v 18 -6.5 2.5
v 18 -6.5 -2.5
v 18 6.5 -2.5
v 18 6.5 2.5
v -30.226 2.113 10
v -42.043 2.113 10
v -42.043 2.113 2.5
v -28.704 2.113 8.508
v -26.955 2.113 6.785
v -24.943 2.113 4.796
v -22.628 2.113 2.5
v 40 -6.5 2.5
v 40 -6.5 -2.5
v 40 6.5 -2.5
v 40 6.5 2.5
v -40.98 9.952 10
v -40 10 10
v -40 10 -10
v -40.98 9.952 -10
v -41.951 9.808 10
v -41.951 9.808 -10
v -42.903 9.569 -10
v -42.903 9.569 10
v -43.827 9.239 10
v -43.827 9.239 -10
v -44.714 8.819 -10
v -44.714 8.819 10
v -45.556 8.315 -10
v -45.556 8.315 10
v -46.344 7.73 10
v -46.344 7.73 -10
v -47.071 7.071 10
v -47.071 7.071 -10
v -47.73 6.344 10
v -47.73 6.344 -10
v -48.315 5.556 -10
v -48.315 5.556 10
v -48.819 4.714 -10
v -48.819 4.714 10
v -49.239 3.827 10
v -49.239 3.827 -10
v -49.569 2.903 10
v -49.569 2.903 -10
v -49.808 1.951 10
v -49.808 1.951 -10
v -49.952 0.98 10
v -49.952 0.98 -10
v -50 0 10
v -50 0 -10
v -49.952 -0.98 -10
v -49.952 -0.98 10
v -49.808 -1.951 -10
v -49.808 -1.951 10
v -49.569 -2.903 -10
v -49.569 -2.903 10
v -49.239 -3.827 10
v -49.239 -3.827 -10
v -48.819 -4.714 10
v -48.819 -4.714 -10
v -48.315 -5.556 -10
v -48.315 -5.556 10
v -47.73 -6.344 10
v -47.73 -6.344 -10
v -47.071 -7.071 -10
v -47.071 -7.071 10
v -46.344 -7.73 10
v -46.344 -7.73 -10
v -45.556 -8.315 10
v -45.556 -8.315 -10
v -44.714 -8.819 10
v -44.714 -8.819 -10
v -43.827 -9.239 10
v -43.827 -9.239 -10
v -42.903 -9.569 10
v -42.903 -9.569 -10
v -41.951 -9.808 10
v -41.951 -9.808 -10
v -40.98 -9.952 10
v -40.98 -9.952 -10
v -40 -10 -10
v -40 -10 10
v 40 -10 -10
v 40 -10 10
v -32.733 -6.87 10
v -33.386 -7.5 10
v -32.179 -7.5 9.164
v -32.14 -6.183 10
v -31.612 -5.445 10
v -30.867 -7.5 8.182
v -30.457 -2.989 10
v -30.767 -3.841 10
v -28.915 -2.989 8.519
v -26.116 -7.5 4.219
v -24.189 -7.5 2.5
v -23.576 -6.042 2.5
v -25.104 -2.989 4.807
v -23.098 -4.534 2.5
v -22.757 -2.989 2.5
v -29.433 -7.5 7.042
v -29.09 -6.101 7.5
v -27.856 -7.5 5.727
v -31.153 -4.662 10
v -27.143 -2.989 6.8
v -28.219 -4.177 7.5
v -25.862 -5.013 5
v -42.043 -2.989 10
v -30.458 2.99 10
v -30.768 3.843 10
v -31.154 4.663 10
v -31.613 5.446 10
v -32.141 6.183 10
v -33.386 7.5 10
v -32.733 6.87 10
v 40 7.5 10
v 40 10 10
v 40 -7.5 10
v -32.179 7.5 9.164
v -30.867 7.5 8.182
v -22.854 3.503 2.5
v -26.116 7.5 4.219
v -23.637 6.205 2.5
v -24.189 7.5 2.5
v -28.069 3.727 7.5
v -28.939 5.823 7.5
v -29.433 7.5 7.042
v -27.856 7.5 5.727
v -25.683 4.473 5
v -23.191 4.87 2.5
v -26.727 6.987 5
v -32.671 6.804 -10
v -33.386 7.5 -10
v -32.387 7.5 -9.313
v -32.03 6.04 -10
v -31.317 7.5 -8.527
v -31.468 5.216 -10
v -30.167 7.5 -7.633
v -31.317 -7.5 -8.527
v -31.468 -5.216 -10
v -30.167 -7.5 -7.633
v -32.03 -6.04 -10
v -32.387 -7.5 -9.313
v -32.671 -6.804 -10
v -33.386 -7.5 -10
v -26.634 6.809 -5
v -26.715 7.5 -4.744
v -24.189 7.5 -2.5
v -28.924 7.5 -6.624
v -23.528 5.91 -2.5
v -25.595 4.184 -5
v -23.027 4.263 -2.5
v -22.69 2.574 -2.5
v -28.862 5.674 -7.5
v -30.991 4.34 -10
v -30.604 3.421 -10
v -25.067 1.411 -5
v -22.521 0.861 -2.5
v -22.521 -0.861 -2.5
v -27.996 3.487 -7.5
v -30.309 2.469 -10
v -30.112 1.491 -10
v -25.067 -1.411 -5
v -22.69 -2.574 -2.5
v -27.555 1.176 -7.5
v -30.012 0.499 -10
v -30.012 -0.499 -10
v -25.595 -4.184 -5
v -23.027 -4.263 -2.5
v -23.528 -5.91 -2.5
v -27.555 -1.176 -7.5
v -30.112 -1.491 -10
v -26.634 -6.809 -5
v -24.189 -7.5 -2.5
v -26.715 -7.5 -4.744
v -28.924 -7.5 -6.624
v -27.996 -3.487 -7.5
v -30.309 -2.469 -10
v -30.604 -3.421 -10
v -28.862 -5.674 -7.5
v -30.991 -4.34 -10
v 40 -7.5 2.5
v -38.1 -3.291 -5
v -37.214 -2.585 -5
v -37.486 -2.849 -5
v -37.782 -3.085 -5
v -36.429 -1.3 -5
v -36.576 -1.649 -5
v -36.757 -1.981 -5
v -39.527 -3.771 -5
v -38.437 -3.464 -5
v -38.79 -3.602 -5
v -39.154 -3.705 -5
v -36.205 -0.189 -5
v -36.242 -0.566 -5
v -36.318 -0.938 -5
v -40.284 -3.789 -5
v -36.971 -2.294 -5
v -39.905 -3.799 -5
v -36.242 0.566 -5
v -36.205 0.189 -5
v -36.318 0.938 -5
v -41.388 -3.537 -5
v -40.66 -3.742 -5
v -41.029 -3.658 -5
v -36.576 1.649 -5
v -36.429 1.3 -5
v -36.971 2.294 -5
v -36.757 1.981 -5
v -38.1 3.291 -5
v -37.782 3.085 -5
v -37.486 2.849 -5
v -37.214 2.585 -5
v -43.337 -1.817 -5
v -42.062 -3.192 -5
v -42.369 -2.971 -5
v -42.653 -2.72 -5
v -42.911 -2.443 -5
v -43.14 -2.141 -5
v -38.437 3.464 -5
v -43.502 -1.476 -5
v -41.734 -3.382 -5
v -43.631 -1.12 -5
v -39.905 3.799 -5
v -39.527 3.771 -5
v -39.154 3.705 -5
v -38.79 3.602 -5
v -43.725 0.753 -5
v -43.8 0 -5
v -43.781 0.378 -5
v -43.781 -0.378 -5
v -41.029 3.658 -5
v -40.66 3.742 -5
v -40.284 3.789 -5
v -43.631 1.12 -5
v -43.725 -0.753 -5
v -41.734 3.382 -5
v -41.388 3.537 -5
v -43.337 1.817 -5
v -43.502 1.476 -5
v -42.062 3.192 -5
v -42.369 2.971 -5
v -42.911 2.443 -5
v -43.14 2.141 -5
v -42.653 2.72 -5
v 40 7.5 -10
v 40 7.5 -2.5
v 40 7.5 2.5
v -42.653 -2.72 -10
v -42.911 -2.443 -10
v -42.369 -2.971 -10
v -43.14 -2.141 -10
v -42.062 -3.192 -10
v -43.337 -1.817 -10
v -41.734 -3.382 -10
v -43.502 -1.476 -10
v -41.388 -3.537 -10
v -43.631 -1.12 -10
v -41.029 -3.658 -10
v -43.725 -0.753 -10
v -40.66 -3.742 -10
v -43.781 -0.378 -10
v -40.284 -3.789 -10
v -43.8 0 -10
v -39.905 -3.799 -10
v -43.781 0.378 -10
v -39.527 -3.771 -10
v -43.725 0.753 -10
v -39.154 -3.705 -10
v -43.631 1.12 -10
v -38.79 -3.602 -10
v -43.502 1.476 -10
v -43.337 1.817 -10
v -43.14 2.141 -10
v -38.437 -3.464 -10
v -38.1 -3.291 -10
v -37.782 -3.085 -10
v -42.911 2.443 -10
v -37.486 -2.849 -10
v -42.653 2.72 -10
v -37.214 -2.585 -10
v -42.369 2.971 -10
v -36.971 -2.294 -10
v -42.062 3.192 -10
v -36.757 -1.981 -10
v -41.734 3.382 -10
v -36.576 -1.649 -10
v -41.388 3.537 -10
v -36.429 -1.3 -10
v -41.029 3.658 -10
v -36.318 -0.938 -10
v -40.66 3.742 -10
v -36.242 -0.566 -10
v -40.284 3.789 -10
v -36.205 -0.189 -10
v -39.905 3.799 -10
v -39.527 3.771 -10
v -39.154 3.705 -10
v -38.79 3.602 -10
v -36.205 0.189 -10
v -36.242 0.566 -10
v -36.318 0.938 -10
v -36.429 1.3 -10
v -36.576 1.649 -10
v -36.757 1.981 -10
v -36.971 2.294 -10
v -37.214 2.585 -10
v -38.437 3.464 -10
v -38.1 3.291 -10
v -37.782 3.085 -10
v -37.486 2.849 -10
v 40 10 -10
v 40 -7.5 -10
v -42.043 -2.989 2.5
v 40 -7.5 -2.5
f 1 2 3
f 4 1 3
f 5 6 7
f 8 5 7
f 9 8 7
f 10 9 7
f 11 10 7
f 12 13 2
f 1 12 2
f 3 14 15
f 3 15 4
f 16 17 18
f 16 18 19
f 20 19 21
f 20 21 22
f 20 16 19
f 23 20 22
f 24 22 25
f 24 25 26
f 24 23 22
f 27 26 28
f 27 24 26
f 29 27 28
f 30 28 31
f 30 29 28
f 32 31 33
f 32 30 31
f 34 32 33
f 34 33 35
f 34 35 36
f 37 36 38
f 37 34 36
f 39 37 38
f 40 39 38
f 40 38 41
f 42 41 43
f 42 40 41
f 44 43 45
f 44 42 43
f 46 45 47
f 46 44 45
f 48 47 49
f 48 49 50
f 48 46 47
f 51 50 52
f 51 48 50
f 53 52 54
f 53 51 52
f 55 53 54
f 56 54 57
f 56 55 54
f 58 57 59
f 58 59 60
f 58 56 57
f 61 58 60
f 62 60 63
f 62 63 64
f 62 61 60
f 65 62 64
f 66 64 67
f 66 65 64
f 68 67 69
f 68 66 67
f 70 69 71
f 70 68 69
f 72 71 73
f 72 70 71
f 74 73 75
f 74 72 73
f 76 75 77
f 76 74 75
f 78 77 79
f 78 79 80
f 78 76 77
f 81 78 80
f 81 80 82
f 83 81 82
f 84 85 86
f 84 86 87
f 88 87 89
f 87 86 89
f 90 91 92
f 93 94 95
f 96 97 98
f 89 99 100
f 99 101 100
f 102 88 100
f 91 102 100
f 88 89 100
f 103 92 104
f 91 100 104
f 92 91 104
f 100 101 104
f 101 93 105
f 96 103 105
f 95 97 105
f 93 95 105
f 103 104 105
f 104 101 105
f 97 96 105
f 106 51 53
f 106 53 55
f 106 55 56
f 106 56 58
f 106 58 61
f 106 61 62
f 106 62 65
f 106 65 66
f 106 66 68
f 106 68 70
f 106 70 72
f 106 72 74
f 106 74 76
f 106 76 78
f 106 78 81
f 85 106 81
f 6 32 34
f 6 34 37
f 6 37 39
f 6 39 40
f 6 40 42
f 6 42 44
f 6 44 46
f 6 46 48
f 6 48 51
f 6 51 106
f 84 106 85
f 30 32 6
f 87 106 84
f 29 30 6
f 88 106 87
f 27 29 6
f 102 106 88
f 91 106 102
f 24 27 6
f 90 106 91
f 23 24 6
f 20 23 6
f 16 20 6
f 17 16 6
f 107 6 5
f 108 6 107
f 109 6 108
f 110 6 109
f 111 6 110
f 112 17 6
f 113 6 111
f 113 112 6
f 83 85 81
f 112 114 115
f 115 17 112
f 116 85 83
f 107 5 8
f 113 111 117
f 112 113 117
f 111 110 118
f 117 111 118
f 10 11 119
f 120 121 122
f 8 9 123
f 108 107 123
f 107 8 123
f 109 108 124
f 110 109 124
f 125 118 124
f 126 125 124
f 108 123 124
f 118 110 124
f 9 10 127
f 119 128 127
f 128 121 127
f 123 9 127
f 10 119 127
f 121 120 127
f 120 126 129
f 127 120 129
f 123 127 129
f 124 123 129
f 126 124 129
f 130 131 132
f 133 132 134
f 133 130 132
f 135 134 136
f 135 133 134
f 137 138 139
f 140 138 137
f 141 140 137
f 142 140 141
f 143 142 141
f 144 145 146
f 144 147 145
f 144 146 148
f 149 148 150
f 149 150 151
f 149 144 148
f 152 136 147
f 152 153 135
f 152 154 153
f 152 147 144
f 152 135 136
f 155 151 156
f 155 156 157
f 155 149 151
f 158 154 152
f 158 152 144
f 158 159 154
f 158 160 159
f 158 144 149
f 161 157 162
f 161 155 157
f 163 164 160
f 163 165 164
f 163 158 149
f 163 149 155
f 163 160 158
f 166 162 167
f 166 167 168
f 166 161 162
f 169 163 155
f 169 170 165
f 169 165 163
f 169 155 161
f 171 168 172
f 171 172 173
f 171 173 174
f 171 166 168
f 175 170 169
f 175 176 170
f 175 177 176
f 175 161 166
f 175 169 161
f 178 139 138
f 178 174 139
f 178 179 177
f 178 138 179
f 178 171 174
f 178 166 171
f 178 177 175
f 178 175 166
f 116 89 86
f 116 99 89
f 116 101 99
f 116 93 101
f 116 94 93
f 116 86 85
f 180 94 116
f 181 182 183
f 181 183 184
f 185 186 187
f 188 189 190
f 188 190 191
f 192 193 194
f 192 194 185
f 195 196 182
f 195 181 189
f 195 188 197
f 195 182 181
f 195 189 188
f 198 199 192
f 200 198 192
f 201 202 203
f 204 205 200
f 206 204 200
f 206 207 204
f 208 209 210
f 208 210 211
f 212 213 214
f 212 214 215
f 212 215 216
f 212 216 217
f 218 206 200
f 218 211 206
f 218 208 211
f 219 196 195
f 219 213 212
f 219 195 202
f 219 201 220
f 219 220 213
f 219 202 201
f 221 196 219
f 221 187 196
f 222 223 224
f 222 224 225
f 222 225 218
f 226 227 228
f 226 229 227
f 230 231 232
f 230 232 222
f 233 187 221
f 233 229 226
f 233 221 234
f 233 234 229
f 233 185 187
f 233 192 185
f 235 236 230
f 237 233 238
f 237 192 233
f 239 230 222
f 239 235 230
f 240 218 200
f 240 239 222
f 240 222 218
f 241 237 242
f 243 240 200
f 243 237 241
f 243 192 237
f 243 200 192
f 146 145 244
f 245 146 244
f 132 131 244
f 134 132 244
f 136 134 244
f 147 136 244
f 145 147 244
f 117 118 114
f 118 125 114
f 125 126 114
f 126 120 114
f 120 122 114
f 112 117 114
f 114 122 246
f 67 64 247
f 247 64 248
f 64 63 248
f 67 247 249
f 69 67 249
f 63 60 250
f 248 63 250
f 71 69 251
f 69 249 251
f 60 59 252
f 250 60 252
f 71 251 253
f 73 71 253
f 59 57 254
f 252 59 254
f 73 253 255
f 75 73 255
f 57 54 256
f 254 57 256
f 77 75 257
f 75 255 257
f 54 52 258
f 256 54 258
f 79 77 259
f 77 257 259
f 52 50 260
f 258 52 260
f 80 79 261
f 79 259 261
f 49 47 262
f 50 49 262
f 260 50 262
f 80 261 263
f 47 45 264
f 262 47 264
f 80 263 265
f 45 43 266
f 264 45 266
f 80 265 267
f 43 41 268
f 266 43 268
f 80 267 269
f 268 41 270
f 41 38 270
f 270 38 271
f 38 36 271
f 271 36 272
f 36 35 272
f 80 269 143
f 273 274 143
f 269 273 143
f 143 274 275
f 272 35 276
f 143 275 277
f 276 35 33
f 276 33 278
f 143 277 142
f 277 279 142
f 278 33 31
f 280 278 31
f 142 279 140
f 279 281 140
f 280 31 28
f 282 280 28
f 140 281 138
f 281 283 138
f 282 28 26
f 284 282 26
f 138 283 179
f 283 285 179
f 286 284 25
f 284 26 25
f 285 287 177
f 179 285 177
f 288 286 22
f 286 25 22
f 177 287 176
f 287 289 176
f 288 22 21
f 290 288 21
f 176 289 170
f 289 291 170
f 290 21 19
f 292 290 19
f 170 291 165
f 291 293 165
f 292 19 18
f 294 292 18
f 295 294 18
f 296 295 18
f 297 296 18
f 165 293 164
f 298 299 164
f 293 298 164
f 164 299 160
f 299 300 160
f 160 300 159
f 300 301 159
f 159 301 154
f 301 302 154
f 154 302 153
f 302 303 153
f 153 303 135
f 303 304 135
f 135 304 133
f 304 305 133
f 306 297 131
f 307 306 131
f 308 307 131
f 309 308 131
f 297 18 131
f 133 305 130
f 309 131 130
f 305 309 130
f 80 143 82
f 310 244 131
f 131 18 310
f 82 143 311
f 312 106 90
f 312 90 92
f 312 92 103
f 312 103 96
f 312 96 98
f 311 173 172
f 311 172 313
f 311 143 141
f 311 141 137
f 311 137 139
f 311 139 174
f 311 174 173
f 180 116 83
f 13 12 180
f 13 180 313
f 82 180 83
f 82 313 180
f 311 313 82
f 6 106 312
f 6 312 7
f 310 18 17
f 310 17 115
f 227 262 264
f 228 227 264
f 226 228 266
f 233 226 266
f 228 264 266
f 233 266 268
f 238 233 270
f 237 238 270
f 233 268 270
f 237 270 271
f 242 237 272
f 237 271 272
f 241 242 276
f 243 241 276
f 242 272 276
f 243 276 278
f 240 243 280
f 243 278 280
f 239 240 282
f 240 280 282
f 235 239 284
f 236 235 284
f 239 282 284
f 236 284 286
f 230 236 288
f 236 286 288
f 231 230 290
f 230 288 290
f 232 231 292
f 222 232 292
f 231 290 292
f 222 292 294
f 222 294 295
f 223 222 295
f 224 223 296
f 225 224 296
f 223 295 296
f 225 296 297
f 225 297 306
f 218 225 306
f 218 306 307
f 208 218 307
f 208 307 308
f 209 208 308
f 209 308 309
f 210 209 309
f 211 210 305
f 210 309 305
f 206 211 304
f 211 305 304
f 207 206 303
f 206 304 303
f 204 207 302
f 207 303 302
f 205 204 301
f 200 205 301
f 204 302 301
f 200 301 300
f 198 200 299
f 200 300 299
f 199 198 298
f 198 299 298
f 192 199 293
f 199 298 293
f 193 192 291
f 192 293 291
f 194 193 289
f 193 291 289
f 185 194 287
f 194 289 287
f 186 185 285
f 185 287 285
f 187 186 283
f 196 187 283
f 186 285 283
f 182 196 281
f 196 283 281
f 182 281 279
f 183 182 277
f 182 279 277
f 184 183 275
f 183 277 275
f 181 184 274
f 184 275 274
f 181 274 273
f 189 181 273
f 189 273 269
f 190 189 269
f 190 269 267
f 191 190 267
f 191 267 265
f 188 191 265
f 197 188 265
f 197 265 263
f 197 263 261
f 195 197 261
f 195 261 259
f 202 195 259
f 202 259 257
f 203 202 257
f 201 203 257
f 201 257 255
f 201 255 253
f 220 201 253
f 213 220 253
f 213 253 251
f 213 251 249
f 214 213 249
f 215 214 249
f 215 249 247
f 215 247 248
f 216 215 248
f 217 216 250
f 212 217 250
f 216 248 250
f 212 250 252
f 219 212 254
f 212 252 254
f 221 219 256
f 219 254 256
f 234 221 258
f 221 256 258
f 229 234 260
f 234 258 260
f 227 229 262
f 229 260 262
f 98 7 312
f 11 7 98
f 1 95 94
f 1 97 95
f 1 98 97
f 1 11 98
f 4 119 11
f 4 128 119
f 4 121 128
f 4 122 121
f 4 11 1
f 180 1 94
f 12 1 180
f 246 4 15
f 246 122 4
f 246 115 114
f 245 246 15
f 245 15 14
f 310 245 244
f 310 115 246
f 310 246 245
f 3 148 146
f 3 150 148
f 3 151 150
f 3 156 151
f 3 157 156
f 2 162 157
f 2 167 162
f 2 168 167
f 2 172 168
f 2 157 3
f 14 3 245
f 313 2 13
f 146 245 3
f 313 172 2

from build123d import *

# Parameters (mm, degrees)
SKETCH1_W           = 80
SKETCH1_H           = 20
BOSS_EXTRUDE1_DEPTH = 10
SKETCH2_W           = 80
SKETCH2_H           = 7.5
CUT_EXTRUDE1_DEPTH  = 7.5
SKETCH3_R           = 10
BOSS_EXTRUDE2_DEPTH = 10
CHAMFER1_SIZE       = 7.5
SKETCH8_W           = 24.4009661
SKETCH8_H           = 5.102020184
CUT_EXTRUDE2_DEPTH  = 7.5
SKETCH9_R           = 3.8
CUT_EXTRUDE3_DEPTH  = 5
CUT_EXTRUDE4_REACH  = 54.5
SKETCH10_W          = 22
SKETCH10_H          = 13


with BuildPart() as part:
    # Sketch1 → Boss-Extrude1 (new, symmetric)
    with BuildSketch(Plane(origin=(0, 0, 0), x_dir=(1, 0, 0), z_dir=(0, 1, 0))):
        Rectangle(SKETCH1_W, SKETCH1_H)
    extrude(amount=BOSS_EXTRUDE1_DEPTH, both=True)

    # Sketch2 → Cut-Extrude1 (cut, symmetric)
    with BuildSketch(Plane(origin=(0, 0, 0), x_dir=(1, 0, 0), z_dir=(0, 1, 0))):
        with Locations((0, 6.25)):
            Rectangle(SKETCH2_W, SKETCH2_H)
        with Locations((0, -6.25)):
            Rectangle(SKETCH2_W, SKETCH2_H)
    extrude(amount=CUT_EXTRUDE1_DEPTH, both=True, mode=Mode.SUBTRACT)

    # Sketch3 → Boss-Extrude2 (add, symmetric)
    with BuildSketch(Plane.XY):
        with Locations((-40, 0)):
            Circle(SKETCH3_R)
    extrude(amount=BOSS_EXTRUDE2_DEPTH, both=True)

    # Chamfer1
    chamfer1_edges = [part.edges().sort_by_distance(p)[0] for p in [
        (-30, 0, -2.5),
        (-30, 0, 2.5),
    ]]
    chamfer(chamfer1_edges, length=CHAMFER1_SIZE - 0.0001)  # a hair under: the kernel refuses the full size

    # Sketch8 → Cut-Extrude2 (cut)
    with BuildSketch(Plane.XY.offset(10)):
        with Locations((-29.842461096, -0.437762938)):
            Rectangle(SKETCH8_W, SKETCH8_H)
    extrude(amount=-CUT_EXTRUDE2_DEPTH, mode=Mode.SUBTRACT)

    # Sketch9 → Cut-Extrude3 (cut)
    with BuildSketch(Plane(origin=(0, 0, -10), x_dir=(-1, 0, 0), z_dir=(0, 0, -1))):
        with Locations((40, 0)):
            Circle(SKETCH9_R)
    extrude(amount=-CUT_EXTRUDE3_DEPTH, mode=Mode.SUBTRACT)

    # Sketch10 → Cut-Extrude4 (cut, up to next)
    with BuildSketch(Plane(origin=(0, 0, -2.5), x_dir=(-1, 0, 0), z_dir=(0, 0, -1)), mode=Mode.PRIVATE) as cut_extrude4_sk1:
        with Locations((-29, 0)):
            Rectangle(SKETCH10_W, SKETCH10_H)
    cut_extrude4_tool1 = extrude(cut_extrude4_sk1.sketch, amount=-CUT_EXTRUDE4_REACH, mode=Mode.PRIVATE) & part.part
    add(cut_extrude4_tool1.solids().sort_by_distance((29, 0, -2.5))[0], mode=Mode.SUBTRACT)


solid = part.part
